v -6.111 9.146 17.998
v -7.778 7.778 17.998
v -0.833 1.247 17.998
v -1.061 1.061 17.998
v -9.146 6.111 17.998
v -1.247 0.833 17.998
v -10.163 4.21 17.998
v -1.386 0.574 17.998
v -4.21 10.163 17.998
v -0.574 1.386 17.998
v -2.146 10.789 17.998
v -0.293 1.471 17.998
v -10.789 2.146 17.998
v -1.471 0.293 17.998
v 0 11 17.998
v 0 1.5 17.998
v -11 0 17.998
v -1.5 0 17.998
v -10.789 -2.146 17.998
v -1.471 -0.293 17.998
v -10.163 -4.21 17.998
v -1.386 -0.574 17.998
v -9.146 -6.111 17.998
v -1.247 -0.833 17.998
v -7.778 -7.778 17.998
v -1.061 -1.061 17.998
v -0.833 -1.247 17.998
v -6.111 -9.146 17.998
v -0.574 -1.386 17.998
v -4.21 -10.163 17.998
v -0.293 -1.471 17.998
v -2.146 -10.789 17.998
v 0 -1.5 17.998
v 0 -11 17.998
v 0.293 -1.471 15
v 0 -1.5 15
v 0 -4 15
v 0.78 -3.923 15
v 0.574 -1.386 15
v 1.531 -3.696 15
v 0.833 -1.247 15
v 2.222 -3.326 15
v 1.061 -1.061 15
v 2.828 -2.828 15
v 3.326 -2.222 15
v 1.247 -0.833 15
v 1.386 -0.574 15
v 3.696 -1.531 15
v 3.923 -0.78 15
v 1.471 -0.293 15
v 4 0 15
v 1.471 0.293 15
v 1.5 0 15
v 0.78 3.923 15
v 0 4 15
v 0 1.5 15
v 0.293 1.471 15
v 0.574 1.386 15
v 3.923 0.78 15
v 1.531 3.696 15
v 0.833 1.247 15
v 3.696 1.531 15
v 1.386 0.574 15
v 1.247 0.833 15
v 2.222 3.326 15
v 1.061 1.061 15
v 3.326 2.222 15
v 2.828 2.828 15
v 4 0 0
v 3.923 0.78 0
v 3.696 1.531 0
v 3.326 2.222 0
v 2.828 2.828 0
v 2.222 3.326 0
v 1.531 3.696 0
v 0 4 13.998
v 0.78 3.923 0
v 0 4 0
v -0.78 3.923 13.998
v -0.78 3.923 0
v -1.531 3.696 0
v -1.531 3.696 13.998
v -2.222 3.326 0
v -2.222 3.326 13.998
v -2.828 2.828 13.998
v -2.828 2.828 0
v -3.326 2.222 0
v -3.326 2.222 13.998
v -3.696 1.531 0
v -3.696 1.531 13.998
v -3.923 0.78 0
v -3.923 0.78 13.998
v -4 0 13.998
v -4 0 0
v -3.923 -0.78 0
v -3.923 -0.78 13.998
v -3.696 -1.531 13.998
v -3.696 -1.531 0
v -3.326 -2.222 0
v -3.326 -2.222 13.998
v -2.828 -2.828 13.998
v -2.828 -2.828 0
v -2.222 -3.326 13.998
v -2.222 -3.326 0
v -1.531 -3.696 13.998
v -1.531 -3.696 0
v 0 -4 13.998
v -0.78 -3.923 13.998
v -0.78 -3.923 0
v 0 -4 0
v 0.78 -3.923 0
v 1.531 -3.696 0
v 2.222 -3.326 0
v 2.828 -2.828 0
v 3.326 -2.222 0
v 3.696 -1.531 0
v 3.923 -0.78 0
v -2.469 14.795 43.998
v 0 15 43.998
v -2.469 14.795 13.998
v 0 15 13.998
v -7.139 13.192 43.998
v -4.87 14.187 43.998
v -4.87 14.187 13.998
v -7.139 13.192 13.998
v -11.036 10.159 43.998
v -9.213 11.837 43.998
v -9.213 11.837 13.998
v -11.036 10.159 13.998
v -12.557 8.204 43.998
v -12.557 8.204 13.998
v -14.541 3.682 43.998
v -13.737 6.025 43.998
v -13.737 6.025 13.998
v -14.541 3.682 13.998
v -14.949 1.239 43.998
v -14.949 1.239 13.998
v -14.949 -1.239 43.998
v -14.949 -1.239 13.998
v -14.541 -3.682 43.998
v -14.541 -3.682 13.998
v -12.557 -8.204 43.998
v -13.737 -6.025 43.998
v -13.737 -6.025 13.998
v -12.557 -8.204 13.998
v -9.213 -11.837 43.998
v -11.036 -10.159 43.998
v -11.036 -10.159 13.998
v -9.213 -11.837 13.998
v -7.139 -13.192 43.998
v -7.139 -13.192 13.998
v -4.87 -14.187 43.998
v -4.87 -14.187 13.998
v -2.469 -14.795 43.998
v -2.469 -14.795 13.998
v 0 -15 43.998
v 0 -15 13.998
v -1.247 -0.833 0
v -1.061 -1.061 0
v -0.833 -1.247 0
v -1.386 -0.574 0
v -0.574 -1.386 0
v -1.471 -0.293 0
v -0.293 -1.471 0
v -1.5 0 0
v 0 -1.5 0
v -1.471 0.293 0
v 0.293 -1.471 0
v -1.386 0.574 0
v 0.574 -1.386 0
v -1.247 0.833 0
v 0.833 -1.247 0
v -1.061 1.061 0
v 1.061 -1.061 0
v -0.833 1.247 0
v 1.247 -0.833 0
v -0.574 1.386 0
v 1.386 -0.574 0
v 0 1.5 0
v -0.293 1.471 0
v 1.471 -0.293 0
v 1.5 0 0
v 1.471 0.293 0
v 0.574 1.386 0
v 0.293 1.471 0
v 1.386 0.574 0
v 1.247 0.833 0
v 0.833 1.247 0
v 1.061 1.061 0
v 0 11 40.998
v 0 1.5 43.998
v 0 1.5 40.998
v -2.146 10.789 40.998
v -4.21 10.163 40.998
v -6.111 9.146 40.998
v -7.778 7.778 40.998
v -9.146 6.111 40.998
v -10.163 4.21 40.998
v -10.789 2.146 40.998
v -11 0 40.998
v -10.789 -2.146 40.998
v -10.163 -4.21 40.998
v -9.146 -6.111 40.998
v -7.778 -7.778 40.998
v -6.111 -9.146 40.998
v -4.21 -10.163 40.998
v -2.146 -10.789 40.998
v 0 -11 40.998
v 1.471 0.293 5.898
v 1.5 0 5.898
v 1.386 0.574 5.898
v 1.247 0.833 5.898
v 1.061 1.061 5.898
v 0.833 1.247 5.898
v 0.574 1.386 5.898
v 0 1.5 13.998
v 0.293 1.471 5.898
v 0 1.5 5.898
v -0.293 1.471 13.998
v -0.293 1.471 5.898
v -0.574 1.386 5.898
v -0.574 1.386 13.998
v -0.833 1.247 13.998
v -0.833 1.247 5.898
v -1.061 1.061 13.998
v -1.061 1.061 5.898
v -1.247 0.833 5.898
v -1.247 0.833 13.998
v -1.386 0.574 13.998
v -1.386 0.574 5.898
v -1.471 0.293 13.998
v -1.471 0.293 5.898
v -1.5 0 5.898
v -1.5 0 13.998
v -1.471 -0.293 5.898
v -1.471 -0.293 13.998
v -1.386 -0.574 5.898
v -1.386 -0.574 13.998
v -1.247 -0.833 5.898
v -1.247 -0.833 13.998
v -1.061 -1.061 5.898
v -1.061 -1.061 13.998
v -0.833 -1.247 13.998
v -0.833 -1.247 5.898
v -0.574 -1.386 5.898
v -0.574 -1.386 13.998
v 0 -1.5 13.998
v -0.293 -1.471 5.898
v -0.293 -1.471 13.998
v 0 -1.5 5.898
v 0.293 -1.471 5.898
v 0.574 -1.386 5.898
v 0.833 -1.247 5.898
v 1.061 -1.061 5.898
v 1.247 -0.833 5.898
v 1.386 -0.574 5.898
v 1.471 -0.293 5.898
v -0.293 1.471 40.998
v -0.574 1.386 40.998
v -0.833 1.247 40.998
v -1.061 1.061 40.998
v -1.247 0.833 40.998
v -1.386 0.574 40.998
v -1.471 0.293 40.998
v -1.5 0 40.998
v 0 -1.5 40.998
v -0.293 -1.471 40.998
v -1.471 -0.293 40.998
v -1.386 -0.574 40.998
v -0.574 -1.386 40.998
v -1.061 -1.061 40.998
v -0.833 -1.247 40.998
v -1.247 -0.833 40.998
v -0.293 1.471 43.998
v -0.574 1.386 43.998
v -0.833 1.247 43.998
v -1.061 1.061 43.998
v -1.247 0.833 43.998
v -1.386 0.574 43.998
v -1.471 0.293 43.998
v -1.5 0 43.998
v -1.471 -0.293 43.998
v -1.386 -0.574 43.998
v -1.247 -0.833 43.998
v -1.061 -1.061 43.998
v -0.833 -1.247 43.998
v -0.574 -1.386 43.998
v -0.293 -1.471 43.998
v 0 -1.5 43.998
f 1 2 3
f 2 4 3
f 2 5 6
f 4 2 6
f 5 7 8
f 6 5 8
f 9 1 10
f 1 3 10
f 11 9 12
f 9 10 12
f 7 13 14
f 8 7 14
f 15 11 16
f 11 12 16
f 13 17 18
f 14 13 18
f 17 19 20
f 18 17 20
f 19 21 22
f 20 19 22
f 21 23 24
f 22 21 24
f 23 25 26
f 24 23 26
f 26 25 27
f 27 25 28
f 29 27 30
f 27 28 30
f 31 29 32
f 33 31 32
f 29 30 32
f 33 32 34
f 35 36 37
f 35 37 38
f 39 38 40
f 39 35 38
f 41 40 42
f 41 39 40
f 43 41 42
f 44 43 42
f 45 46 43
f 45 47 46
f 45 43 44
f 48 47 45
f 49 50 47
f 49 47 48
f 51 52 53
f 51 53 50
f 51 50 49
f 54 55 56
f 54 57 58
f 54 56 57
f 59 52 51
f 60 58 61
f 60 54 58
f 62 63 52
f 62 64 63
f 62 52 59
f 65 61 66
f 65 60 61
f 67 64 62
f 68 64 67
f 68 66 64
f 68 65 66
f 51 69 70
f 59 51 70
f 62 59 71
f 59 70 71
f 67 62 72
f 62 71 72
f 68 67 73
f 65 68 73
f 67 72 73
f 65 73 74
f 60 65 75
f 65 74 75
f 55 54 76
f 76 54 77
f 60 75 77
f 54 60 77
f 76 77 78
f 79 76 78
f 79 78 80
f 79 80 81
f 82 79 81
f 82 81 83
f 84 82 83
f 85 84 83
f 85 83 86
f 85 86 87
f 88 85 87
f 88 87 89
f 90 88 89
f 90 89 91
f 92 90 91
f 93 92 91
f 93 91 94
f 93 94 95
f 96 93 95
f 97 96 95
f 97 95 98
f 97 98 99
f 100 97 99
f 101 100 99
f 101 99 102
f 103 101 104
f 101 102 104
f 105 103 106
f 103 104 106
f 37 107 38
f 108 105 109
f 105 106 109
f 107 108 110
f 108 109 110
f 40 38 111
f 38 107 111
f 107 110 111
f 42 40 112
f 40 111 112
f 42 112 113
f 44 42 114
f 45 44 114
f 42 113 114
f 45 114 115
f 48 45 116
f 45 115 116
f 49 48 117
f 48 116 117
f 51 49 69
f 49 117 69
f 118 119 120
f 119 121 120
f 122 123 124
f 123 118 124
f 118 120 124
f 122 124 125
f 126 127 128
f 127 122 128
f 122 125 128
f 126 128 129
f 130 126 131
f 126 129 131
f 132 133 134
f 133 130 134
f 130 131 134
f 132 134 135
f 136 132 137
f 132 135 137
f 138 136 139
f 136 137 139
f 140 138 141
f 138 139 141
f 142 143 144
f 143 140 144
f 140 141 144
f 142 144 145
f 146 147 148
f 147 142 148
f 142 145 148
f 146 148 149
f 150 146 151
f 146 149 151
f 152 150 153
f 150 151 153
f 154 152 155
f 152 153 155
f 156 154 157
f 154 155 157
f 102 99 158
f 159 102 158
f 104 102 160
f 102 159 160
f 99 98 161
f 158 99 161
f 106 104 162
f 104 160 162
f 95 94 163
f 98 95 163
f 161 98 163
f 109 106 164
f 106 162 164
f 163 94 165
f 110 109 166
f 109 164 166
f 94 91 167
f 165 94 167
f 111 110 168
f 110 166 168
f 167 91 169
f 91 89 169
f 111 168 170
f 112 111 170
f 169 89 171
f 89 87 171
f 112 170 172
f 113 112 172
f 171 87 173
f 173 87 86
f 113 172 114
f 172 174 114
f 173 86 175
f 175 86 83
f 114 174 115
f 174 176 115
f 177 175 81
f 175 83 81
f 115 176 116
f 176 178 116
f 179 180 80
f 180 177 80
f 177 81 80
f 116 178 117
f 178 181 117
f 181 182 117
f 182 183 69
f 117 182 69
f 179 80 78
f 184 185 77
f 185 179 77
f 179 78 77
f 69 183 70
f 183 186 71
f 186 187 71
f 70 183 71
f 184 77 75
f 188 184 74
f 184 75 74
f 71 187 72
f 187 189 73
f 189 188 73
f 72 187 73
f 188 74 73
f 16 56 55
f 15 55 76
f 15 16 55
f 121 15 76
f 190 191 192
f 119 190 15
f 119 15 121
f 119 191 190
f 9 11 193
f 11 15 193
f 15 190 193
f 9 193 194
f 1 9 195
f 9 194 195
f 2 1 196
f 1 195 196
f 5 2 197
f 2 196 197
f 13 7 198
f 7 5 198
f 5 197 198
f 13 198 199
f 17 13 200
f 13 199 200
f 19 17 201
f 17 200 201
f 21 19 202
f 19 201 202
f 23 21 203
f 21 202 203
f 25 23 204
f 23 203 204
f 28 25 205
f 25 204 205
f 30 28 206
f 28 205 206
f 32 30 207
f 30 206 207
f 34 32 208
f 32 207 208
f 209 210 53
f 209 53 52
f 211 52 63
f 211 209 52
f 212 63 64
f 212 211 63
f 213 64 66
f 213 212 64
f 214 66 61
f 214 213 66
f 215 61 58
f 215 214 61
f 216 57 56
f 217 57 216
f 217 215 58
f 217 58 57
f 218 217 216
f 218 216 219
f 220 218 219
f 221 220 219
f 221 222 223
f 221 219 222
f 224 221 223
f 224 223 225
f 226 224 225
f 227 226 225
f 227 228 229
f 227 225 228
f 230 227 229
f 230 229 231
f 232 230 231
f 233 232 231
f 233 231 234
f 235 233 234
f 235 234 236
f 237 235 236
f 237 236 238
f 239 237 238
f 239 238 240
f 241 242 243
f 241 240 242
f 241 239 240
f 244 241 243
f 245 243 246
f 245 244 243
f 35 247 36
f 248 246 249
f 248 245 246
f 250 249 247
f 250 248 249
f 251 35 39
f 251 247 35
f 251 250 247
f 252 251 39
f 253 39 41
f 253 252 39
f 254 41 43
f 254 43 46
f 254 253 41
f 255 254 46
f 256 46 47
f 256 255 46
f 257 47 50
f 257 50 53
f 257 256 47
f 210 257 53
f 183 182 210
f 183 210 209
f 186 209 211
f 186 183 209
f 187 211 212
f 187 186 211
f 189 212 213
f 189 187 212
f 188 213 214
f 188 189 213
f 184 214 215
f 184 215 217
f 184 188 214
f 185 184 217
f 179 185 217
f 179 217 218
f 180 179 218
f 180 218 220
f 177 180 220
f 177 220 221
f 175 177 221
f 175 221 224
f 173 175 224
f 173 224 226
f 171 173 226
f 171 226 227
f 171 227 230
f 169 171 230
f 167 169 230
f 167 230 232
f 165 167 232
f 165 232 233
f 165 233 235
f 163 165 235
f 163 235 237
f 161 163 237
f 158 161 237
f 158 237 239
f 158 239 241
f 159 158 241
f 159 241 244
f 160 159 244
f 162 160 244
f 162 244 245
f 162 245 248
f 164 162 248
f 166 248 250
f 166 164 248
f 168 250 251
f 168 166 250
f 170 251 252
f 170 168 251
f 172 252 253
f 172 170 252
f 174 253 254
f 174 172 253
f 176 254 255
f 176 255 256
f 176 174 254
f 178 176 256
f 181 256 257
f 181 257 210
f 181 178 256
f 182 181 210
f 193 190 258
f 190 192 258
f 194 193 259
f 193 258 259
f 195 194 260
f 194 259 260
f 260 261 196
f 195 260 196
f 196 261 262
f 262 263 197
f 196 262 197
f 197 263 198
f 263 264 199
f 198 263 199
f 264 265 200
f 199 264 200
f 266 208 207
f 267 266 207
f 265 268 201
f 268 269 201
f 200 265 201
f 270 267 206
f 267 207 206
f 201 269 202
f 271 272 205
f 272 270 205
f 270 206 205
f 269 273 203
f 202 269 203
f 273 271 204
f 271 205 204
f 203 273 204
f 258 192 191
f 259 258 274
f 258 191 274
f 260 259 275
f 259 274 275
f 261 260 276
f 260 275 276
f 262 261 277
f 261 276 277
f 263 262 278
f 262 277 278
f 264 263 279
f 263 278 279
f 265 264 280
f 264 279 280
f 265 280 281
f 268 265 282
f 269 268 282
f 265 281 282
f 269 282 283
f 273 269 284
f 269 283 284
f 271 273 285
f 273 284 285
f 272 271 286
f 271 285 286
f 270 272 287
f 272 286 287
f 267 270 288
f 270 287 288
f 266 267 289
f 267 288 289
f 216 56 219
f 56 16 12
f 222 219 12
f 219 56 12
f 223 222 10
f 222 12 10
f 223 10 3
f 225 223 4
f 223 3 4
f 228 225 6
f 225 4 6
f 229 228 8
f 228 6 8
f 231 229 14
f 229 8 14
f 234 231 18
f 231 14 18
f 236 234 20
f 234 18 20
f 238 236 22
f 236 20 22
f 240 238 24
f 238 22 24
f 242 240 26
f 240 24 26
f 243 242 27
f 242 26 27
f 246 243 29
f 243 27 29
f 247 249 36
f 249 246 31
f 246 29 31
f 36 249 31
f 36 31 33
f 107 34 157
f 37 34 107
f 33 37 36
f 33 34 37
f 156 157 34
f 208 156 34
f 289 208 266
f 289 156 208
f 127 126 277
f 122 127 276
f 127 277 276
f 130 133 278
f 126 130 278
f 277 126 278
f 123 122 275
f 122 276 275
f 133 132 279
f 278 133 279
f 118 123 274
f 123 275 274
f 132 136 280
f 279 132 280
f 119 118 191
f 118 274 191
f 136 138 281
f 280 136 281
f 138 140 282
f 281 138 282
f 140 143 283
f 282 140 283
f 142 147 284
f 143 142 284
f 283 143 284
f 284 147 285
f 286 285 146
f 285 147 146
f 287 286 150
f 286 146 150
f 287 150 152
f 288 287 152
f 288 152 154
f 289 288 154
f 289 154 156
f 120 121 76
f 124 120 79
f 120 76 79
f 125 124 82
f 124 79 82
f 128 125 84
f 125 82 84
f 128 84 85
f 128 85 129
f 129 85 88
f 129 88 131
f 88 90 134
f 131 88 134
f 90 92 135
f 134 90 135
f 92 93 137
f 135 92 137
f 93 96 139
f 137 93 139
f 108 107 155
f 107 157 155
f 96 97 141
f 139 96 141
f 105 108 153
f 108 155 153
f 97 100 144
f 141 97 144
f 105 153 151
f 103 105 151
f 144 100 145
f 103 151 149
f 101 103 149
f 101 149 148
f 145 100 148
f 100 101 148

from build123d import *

# Parameters (mm, degrees)
F0_R     = 4
F0_R_2   = 1.5
F1_DEPTH = 15
F3_ANGLE = 180
F4_R     = 1.5
F5_DEPTH = 38.1


with BuildPart() as f1:
    # F0 (on Top) → F1 (new body)
    with BuildSketch(Plane.XY):
        Circle(F0_R)
        Circle(F0_R_2, mode=Mode.SUBTRACT)
    extrude(amount=F1_DEPTH)

    # F2 (on Front) → F3 (revolve, symmetric)
    with BuildSketch(Plane.XZ) as f3_sk:
        Polygon((-15, 13.998025), (0, 13.998025), (0, 17.998025), (-11, 17.998025), (-11, 40.998025), (0, 40.998025), (0, 43.998025), (-15, 43.998025), align=None)
    revolve(axis=Axis((0, 0, 21.028005), (0, 0, -1)), revolution_arc=F3_ANGLE / 2)
    revolve(f3_sk.sketch, axis=Axis((0, 0, 21.028005), (0, 0, 1)), revolution_arc=F3_ANGLE / 2)

    # F4 (on face) → F5 (cut)
    with BuildSketch(Plane.XY.offset(43.998025)):
        Circle(F4_R)
    extrude(amount=-F5_DEPTH, mode=Mode.SUBTRACT)


solid = f1.part
